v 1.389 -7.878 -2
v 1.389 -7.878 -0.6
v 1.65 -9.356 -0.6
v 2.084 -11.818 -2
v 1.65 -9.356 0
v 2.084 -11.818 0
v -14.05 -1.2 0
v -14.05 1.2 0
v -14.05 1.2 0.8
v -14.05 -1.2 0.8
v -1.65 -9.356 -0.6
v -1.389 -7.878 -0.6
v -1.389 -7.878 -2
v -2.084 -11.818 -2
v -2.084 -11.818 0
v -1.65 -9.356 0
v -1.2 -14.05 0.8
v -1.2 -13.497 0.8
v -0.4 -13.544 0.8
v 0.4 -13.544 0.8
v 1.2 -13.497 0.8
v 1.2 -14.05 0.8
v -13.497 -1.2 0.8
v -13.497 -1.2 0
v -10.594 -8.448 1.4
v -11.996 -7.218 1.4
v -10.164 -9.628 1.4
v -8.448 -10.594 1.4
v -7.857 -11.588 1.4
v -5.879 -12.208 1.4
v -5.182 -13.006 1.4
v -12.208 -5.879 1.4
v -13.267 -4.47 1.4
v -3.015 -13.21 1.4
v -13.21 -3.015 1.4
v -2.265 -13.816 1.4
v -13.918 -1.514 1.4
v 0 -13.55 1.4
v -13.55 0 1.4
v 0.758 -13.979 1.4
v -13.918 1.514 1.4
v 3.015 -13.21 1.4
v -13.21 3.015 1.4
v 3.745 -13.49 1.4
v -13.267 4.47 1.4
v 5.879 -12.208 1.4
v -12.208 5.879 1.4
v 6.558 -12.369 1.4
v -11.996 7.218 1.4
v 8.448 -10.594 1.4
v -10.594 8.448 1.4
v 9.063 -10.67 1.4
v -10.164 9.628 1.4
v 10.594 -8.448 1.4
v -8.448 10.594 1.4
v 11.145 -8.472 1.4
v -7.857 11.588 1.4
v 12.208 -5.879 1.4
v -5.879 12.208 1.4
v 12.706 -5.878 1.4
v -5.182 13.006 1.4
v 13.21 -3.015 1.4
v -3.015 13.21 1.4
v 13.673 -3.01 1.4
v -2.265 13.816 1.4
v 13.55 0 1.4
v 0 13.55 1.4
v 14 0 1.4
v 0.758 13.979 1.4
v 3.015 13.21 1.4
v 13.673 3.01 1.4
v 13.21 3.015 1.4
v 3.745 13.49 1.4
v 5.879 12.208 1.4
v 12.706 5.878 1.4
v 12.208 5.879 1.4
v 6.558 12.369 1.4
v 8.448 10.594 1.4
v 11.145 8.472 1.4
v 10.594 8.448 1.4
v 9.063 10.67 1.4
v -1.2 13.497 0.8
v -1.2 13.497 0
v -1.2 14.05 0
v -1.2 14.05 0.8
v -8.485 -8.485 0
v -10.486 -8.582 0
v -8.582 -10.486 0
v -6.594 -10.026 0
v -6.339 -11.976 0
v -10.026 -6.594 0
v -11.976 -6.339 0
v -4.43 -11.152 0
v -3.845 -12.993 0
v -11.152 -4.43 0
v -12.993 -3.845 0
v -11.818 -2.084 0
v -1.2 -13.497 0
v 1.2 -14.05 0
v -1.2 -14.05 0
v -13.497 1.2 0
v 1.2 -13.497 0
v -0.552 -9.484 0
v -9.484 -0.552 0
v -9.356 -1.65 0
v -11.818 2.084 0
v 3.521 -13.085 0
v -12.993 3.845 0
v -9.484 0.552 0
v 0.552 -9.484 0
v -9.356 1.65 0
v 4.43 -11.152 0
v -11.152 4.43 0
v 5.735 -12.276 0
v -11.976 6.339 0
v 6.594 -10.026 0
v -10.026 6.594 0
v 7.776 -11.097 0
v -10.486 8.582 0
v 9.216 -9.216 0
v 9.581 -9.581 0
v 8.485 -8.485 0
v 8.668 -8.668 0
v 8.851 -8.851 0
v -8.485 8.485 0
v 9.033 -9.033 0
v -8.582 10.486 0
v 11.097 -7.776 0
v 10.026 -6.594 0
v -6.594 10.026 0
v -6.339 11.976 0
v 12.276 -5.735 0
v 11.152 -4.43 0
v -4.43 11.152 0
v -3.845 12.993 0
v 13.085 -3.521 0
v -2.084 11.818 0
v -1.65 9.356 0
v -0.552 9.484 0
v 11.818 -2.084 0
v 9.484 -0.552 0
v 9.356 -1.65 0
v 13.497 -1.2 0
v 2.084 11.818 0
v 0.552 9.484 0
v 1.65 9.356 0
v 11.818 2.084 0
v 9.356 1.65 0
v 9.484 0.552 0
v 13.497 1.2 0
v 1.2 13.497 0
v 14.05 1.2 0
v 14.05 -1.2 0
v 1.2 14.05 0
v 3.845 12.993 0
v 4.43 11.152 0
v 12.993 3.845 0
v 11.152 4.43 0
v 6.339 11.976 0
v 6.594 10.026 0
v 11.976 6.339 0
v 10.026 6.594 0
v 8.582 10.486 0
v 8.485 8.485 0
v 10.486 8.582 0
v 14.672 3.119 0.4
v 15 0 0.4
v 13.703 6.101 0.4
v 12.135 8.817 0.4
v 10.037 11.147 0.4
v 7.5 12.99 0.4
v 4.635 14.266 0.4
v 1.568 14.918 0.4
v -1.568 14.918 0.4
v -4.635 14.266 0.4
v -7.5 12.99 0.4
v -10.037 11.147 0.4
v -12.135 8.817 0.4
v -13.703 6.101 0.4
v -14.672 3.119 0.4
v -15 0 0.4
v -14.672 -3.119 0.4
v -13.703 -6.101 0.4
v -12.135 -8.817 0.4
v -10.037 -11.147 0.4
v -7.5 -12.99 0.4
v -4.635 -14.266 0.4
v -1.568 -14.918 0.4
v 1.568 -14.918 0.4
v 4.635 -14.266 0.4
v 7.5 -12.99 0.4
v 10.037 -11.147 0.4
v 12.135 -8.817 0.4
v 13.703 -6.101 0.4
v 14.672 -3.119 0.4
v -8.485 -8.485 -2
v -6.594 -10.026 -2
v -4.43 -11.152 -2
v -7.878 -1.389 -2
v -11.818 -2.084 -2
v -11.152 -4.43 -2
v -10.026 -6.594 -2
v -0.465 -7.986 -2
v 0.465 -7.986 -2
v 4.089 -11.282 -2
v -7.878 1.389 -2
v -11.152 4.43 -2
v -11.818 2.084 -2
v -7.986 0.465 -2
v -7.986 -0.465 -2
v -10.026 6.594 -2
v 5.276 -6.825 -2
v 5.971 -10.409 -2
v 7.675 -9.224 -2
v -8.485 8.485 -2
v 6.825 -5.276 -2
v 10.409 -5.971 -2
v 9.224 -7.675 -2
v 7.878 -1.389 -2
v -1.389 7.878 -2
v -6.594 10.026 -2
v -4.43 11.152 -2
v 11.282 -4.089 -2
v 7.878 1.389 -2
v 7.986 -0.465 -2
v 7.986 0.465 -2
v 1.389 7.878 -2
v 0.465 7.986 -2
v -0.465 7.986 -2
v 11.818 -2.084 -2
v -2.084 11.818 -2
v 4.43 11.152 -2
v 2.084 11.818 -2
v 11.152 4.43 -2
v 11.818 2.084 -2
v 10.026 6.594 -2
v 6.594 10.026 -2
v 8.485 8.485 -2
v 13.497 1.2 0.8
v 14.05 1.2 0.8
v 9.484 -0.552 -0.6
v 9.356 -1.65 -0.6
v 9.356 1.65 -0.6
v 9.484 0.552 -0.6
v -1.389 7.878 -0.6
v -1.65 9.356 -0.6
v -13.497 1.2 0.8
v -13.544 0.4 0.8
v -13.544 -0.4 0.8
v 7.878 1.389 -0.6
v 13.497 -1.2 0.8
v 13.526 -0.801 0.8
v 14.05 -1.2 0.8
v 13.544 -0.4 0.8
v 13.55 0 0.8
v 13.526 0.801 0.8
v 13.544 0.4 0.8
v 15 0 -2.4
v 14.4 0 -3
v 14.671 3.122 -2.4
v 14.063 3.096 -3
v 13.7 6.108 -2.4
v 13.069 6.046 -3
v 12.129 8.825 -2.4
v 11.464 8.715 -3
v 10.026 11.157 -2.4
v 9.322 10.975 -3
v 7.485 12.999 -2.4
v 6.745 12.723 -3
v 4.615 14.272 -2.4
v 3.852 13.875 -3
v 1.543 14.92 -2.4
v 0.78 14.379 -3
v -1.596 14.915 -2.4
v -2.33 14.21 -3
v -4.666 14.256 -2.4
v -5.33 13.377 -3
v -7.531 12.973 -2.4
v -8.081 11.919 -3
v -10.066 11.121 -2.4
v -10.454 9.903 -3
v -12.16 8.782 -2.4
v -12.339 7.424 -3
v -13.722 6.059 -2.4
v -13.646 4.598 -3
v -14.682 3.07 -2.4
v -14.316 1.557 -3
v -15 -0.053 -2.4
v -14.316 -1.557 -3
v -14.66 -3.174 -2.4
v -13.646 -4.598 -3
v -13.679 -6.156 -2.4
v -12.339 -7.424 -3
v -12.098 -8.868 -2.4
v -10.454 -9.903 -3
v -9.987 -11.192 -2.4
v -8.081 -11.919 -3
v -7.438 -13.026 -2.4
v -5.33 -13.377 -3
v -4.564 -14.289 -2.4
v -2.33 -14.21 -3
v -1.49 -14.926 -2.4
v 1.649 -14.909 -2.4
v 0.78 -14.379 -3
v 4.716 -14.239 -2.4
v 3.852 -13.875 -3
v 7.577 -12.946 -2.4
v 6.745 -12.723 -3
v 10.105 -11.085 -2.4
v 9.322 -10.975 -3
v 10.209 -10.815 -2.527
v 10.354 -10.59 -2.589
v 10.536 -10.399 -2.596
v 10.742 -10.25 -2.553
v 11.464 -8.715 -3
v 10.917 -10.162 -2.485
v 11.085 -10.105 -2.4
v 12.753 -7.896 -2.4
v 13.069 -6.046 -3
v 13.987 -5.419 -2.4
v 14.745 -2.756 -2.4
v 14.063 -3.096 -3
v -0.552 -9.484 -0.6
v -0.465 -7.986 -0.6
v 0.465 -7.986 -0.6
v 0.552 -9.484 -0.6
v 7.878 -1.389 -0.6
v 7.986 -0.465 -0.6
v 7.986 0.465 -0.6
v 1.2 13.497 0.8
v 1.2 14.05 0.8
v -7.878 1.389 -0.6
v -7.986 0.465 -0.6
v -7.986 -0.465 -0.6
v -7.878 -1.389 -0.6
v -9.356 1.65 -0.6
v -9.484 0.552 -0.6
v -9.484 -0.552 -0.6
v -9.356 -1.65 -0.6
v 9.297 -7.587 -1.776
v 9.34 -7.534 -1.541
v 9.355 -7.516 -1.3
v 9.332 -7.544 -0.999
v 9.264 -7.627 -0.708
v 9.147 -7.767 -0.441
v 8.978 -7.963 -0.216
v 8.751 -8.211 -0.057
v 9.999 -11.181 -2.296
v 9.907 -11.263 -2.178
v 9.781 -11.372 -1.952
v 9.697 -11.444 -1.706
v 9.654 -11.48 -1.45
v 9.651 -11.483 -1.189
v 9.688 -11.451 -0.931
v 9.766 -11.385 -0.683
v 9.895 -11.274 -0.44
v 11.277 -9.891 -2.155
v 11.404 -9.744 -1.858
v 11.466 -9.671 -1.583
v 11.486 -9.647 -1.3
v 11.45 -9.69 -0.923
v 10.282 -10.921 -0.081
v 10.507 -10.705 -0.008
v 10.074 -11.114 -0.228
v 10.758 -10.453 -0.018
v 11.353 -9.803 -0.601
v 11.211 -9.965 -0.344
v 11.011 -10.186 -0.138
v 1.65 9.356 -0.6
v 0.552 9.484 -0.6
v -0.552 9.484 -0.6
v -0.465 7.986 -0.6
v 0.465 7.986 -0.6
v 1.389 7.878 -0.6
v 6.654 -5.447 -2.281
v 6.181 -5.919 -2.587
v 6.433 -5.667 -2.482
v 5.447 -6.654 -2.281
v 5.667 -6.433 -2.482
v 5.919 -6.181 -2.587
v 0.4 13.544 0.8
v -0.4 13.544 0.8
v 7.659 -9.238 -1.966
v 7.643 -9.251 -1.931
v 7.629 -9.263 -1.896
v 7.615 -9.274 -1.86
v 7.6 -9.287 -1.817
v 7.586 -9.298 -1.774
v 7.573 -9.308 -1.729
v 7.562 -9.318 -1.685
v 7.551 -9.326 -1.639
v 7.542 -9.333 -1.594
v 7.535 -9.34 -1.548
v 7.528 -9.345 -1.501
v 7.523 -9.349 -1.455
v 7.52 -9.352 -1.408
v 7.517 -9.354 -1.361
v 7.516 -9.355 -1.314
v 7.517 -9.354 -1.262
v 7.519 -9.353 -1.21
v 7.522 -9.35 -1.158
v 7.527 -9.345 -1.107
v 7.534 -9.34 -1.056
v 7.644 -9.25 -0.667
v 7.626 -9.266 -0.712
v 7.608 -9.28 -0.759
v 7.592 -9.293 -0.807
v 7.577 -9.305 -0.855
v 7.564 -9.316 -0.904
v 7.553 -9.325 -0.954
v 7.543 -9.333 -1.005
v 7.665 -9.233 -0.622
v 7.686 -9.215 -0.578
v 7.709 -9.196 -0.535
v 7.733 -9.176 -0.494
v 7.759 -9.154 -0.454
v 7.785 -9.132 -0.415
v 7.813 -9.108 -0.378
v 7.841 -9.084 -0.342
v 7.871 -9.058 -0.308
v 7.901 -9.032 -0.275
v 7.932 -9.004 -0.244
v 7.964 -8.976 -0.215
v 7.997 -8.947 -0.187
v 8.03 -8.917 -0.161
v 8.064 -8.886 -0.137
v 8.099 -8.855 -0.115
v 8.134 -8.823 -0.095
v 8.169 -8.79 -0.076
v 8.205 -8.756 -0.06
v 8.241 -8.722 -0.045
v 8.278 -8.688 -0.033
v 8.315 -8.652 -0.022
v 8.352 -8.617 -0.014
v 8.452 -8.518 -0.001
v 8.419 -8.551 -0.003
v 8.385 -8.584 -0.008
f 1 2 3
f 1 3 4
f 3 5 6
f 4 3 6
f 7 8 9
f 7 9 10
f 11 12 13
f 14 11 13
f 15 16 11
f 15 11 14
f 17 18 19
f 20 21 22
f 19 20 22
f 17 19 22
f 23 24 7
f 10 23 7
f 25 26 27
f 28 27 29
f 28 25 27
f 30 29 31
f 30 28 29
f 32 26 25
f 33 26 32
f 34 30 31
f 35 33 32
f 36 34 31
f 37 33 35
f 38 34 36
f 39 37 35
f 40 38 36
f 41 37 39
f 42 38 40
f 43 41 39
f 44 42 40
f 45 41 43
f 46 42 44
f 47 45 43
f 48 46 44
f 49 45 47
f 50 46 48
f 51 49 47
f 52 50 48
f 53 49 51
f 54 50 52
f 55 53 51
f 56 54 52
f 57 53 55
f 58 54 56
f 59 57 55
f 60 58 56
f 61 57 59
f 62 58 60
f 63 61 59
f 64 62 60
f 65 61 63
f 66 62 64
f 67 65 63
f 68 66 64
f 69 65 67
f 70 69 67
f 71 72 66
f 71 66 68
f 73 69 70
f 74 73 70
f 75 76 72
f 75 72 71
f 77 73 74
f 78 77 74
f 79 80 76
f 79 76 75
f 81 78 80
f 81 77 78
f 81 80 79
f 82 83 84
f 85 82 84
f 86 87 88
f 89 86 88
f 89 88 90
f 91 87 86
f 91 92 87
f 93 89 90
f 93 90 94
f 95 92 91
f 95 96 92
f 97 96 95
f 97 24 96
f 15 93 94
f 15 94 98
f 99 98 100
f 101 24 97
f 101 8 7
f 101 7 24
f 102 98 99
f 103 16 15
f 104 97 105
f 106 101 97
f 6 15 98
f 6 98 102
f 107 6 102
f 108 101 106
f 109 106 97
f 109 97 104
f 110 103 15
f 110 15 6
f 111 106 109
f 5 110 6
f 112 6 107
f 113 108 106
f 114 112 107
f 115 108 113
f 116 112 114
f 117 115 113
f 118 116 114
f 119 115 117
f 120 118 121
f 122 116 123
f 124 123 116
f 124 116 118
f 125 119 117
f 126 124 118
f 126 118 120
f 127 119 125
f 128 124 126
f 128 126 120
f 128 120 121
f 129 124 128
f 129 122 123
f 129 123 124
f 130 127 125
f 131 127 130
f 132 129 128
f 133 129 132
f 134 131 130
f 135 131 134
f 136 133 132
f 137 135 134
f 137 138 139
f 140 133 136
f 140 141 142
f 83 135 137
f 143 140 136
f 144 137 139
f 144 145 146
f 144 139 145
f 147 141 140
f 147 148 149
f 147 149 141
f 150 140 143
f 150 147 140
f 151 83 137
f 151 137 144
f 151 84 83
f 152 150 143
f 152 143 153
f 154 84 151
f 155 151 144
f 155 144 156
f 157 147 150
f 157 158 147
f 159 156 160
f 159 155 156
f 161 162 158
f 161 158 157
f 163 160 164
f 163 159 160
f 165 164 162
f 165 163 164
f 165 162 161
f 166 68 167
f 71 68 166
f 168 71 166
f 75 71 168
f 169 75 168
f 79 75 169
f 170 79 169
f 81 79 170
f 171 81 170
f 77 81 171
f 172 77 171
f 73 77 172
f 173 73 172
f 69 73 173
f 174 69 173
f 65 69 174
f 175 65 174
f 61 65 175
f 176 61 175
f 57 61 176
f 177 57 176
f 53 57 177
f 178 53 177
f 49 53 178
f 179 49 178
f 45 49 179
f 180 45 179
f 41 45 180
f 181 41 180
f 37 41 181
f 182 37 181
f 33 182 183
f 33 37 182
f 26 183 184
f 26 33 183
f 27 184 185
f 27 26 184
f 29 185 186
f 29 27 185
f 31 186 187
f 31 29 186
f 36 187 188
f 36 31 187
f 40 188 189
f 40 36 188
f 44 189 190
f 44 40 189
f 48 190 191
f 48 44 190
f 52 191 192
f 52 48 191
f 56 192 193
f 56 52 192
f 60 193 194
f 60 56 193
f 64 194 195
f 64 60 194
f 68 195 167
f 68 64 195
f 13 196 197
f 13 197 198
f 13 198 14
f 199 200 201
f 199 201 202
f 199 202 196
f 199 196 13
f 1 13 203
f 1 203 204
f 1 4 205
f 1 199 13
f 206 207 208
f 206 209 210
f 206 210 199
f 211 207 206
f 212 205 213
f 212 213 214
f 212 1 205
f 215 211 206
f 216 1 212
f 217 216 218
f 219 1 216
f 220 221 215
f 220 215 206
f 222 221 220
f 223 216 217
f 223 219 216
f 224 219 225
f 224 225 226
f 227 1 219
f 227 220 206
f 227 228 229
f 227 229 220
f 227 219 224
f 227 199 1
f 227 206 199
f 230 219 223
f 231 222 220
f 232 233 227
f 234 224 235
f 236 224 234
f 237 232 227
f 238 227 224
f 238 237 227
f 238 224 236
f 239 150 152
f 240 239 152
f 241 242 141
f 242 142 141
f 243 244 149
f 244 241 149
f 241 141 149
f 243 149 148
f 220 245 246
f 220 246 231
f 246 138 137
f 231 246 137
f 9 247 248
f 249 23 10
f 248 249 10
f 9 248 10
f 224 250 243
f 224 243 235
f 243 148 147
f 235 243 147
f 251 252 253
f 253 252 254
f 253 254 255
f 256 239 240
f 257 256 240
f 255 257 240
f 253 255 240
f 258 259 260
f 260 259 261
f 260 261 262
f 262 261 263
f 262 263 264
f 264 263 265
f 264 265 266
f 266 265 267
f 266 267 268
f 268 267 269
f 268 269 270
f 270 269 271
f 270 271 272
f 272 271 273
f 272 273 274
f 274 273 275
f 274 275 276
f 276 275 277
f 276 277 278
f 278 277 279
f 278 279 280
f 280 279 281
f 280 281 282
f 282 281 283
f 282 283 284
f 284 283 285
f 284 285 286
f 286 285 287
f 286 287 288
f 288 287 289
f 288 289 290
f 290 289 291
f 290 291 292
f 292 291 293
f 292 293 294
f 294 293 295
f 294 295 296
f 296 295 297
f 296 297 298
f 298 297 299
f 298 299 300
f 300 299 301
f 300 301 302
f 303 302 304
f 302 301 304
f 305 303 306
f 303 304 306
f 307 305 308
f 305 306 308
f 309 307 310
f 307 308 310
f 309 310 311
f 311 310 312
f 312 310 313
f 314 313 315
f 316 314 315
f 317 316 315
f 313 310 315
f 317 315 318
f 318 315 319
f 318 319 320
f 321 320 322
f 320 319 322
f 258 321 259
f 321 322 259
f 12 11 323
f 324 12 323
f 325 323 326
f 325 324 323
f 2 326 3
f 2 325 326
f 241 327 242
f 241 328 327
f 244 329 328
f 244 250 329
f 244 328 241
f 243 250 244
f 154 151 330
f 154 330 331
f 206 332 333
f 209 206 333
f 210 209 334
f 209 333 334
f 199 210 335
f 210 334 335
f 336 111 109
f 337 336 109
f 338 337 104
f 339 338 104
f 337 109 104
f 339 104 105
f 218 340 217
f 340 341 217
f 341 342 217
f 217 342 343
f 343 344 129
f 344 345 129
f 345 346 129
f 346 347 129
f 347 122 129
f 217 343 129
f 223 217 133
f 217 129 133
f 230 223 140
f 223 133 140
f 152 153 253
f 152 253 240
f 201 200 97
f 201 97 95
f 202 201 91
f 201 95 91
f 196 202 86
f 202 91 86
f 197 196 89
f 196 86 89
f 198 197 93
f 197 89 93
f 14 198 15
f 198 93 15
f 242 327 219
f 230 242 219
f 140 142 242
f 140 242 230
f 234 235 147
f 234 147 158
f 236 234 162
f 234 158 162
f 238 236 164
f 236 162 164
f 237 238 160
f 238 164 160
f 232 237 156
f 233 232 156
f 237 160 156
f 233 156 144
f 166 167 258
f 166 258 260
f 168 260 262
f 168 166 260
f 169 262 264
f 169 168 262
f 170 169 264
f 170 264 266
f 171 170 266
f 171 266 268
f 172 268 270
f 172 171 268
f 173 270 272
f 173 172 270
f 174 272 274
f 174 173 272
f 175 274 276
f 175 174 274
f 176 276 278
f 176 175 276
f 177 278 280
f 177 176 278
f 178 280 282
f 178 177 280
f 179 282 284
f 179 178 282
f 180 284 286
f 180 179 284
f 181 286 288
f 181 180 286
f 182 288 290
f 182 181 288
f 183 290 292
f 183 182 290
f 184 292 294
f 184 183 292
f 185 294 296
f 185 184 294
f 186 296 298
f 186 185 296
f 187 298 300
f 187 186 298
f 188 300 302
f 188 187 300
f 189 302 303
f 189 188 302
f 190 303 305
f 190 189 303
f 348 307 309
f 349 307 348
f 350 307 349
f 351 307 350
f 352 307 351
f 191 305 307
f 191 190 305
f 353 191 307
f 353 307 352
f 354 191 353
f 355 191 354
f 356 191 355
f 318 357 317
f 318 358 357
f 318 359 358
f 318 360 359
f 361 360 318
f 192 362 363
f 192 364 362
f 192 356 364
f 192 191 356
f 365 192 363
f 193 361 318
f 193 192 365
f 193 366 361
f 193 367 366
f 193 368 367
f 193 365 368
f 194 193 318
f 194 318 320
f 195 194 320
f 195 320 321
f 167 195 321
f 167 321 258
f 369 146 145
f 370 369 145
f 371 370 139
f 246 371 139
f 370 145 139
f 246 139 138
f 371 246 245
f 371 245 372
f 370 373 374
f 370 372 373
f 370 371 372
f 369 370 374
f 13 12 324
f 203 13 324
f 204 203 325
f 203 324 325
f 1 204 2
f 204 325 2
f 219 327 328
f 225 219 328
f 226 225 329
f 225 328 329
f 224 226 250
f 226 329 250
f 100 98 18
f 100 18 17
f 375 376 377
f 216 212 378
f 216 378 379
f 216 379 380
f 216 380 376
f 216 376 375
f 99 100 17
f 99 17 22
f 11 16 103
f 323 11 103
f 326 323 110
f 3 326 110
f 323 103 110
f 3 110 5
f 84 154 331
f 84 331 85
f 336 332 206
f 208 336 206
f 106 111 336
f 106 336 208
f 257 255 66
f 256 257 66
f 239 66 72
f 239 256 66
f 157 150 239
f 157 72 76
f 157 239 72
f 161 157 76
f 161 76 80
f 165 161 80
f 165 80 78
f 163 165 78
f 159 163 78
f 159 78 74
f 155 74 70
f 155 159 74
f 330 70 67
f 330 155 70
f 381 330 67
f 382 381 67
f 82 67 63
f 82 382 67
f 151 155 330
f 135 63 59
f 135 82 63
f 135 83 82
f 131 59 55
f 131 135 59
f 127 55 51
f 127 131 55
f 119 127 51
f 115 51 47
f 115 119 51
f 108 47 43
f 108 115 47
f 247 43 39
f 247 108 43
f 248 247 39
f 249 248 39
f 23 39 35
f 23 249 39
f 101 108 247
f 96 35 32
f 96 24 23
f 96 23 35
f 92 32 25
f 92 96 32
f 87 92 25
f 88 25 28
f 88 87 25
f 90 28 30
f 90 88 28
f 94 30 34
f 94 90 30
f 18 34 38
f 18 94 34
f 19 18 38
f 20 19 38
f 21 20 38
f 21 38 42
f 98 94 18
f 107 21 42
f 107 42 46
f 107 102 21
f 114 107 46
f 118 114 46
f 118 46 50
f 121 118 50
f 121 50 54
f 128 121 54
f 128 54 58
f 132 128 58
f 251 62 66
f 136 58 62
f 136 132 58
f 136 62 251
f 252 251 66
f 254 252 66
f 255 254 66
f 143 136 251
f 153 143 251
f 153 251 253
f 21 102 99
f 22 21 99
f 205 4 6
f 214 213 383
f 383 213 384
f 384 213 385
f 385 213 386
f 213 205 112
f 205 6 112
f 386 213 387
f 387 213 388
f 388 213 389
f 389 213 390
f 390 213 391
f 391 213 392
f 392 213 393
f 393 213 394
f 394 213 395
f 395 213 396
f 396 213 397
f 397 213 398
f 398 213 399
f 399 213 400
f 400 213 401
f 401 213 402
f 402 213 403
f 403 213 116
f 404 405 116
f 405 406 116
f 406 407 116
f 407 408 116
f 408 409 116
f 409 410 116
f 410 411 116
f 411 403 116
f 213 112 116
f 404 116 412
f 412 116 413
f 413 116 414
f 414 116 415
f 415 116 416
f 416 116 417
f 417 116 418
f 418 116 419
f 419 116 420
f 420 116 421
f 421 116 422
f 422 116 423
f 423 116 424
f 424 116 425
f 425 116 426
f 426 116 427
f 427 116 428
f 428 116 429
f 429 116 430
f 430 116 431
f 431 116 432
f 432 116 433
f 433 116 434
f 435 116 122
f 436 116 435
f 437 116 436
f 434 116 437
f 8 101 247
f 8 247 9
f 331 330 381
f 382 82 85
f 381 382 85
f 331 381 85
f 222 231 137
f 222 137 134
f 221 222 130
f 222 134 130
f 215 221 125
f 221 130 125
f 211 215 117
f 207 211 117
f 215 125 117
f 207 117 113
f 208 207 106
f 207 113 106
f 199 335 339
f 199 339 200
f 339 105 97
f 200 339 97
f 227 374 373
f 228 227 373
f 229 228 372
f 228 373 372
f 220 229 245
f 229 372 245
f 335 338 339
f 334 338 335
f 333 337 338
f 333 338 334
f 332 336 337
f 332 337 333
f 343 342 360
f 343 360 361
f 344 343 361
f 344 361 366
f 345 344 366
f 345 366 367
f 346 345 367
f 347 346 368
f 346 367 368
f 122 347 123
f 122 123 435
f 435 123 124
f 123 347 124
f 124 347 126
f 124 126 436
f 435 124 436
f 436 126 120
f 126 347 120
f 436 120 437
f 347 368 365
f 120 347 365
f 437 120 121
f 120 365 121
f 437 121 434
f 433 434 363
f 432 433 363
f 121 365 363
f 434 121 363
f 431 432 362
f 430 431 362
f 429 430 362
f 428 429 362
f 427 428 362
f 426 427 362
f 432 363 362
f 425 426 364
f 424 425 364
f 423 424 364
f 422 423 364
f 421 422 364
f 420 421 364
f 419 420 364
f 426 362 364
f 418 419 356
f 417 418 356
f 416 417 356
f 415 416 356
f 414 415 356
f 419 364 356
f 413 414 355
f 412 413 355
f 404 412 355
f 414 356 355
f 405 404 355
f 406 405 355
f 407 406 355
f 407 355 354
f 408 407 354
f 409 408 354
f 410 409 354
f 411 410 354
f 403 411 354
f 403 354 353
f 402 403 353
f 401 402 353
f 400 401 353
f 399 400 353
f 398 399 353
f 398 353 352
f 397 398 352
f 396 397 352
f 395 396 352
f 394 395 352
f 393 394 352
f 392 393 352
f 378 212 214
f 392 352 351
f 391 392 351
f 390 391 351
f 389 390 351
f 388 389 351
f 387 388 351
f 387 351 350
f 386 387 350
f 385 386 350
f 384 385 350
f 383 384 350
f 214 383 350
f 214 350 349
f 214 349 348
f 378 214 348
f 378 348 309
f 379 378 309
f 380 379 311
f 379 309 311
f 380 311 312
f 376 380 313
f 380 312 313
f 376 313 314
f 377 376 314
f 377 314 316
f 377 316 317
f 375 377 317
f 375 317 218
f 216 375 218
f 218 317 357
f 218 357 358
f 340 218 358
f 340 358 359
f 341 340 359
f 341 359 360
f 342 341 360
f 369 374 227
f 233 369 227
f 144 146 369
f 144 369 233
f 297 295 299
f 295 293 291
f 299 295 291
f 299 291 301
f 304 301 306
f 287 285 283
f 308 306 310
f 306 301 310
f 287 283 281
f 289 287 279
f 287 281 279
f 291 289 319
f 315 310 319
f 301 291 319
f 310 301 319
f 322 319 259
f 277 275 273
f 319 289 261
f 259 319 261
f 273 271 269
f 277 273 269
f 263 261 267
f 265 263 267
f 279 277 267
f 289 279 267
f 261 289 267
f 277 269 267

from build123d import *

# Parameters (mm, degrees)
SKETCH002_R           = 15
SKETCH002_R_2         = 13.55
PAD002_DEPTH          = 3
PAD002_DEPTH_BACK     = 1.4
CHAMFER001_SIZE       = 1
CHAMFER002_SIZE       = 0.6
SKETCH003_R           = 13.55
PAD003_DEPTH          = 1
SKETCH004_W           = 1.1
SKETCH004_H           = 2.4
POCKET_DEPTH          = 0.8
SKETCH005_R           = 13.55
SKETCH005_R_2         = 12
PAD005_DEPTH          = 2
PAD006_DEPTH          = 2
POLARPATTERN001_COUNT = 4
SKETCH007_R           = 9.5
POCKET001_DEPTH       = 0.6
SKETCH008_R           = 1.3
POCKET002_DEPTH       = 7


with BuildPart() as part:
    # Sketch002 → Pad002 (new body, two sides)
    with BuildSketch(Plane.XY) as pad002_sk:
        Circle(SKETCH002_R)
        Circle(SKETCH002_R_2, mode=Mode.SUBTRACT)
    extrude(amount=-PAD002_DEPTH)
    extrude(pad002_sk.sketch, amount=PAD002_DEPTH_BACK)

    # Chamfer001
    chamfer001_edges = [part.edges().sort_by_distance(p)[0] for p in [
        (-15, 0, 1.4),
    ]]
    chamfer(chamfer001_edges, length=CHAMFER001_SIZE)

    # Chamfer002
    chamfer002_edges = [part.edges().sort_by_distance(p)[0] for p in [
        (-15, 0, -3),
    ]]
    chamfer(chamfer002_edges, length=CHAMFER002_SIZE)

    # Sketch003 → Pad003 (join)
    with BuildSketch(Plane.XY.offset(-3)):
        Circle(SKETCH003_R)
    extrude(amount=PAD003_DEPTH)

    # Sketch004 → Pocket (cut)
    with BuildSketch(Plane.XY):
        with Locations((13.5, 0)):
            Rectangle(SKETCH004_W, SKETCH004_H)
    pocket = extrude(amount=POCKET_DEPTH, mode=Mode.SUBTRACT)

    # Sketch005 → Pad005 (join)
    with BuildSketch(Plane.XY):
        Circle(SKETCH005_R)
        Circle(SKETCH005_R_2, mode=Mode.SUBTRACT)
    extrude(amount=-PAD005_DEPTH)

    # Sketch006 → Pad006 (join)
    with BuildSketch(Plane.XY):
        with BuildLine():
            ThreePointArc((12.310097, -2.170602), (12.5, 0), (12.310097, 2.170602))
            Line((7.878462, 1.389185), (12.310097, 2.170602))
            ThreePointArc((7.878462, -1.389185), (8, 0), (7.878462, 1.389185))
            Line((7.878462, -1.389185), (12.310097, -2.170602))
        make_face()
    pad006 = extrude(amount=-PAD006_DEPTH)

    # PolarPattern001: Pocket, Pad006 ×4 about axis
    polarpattern001_axis = Axis((0, 0, 0), (0, 0, 1))
    for i in range(1, POLARPATTERN001_COUNT):
        add(pocket.rotate(polarpattern001_axis, i * 360 / POLARPATTERN001_COUNT), mode=Mode.SUBTRACT)
        add(pad006.rotate(polarpattern001_axis, i * 360 / POLARPATTERN001_COUNT))

    # Sketch007 → Pocket001 (cut)
    with BuildSketch(Plane.XY):
        Circle(SKETCH007_R)
    extrude(amount=-POCKET001_DEPTH, mode=Mode.SUBTRACT)

    # Sketch008 → Pocket002 (cut)
    with BuildSketch(Plane(origin=(11, -11, 0), x_dir=(0.707107, 0.707107, 0), z_dir=(0.707107, -0.707107, 0))):
        with Locations((0, -1.3)):
            Circle(SKETCH008_R)
    extrude(amount=-POCKET002_DEPTH, mode=Mode.SUBTRACT)


solid = part.part
